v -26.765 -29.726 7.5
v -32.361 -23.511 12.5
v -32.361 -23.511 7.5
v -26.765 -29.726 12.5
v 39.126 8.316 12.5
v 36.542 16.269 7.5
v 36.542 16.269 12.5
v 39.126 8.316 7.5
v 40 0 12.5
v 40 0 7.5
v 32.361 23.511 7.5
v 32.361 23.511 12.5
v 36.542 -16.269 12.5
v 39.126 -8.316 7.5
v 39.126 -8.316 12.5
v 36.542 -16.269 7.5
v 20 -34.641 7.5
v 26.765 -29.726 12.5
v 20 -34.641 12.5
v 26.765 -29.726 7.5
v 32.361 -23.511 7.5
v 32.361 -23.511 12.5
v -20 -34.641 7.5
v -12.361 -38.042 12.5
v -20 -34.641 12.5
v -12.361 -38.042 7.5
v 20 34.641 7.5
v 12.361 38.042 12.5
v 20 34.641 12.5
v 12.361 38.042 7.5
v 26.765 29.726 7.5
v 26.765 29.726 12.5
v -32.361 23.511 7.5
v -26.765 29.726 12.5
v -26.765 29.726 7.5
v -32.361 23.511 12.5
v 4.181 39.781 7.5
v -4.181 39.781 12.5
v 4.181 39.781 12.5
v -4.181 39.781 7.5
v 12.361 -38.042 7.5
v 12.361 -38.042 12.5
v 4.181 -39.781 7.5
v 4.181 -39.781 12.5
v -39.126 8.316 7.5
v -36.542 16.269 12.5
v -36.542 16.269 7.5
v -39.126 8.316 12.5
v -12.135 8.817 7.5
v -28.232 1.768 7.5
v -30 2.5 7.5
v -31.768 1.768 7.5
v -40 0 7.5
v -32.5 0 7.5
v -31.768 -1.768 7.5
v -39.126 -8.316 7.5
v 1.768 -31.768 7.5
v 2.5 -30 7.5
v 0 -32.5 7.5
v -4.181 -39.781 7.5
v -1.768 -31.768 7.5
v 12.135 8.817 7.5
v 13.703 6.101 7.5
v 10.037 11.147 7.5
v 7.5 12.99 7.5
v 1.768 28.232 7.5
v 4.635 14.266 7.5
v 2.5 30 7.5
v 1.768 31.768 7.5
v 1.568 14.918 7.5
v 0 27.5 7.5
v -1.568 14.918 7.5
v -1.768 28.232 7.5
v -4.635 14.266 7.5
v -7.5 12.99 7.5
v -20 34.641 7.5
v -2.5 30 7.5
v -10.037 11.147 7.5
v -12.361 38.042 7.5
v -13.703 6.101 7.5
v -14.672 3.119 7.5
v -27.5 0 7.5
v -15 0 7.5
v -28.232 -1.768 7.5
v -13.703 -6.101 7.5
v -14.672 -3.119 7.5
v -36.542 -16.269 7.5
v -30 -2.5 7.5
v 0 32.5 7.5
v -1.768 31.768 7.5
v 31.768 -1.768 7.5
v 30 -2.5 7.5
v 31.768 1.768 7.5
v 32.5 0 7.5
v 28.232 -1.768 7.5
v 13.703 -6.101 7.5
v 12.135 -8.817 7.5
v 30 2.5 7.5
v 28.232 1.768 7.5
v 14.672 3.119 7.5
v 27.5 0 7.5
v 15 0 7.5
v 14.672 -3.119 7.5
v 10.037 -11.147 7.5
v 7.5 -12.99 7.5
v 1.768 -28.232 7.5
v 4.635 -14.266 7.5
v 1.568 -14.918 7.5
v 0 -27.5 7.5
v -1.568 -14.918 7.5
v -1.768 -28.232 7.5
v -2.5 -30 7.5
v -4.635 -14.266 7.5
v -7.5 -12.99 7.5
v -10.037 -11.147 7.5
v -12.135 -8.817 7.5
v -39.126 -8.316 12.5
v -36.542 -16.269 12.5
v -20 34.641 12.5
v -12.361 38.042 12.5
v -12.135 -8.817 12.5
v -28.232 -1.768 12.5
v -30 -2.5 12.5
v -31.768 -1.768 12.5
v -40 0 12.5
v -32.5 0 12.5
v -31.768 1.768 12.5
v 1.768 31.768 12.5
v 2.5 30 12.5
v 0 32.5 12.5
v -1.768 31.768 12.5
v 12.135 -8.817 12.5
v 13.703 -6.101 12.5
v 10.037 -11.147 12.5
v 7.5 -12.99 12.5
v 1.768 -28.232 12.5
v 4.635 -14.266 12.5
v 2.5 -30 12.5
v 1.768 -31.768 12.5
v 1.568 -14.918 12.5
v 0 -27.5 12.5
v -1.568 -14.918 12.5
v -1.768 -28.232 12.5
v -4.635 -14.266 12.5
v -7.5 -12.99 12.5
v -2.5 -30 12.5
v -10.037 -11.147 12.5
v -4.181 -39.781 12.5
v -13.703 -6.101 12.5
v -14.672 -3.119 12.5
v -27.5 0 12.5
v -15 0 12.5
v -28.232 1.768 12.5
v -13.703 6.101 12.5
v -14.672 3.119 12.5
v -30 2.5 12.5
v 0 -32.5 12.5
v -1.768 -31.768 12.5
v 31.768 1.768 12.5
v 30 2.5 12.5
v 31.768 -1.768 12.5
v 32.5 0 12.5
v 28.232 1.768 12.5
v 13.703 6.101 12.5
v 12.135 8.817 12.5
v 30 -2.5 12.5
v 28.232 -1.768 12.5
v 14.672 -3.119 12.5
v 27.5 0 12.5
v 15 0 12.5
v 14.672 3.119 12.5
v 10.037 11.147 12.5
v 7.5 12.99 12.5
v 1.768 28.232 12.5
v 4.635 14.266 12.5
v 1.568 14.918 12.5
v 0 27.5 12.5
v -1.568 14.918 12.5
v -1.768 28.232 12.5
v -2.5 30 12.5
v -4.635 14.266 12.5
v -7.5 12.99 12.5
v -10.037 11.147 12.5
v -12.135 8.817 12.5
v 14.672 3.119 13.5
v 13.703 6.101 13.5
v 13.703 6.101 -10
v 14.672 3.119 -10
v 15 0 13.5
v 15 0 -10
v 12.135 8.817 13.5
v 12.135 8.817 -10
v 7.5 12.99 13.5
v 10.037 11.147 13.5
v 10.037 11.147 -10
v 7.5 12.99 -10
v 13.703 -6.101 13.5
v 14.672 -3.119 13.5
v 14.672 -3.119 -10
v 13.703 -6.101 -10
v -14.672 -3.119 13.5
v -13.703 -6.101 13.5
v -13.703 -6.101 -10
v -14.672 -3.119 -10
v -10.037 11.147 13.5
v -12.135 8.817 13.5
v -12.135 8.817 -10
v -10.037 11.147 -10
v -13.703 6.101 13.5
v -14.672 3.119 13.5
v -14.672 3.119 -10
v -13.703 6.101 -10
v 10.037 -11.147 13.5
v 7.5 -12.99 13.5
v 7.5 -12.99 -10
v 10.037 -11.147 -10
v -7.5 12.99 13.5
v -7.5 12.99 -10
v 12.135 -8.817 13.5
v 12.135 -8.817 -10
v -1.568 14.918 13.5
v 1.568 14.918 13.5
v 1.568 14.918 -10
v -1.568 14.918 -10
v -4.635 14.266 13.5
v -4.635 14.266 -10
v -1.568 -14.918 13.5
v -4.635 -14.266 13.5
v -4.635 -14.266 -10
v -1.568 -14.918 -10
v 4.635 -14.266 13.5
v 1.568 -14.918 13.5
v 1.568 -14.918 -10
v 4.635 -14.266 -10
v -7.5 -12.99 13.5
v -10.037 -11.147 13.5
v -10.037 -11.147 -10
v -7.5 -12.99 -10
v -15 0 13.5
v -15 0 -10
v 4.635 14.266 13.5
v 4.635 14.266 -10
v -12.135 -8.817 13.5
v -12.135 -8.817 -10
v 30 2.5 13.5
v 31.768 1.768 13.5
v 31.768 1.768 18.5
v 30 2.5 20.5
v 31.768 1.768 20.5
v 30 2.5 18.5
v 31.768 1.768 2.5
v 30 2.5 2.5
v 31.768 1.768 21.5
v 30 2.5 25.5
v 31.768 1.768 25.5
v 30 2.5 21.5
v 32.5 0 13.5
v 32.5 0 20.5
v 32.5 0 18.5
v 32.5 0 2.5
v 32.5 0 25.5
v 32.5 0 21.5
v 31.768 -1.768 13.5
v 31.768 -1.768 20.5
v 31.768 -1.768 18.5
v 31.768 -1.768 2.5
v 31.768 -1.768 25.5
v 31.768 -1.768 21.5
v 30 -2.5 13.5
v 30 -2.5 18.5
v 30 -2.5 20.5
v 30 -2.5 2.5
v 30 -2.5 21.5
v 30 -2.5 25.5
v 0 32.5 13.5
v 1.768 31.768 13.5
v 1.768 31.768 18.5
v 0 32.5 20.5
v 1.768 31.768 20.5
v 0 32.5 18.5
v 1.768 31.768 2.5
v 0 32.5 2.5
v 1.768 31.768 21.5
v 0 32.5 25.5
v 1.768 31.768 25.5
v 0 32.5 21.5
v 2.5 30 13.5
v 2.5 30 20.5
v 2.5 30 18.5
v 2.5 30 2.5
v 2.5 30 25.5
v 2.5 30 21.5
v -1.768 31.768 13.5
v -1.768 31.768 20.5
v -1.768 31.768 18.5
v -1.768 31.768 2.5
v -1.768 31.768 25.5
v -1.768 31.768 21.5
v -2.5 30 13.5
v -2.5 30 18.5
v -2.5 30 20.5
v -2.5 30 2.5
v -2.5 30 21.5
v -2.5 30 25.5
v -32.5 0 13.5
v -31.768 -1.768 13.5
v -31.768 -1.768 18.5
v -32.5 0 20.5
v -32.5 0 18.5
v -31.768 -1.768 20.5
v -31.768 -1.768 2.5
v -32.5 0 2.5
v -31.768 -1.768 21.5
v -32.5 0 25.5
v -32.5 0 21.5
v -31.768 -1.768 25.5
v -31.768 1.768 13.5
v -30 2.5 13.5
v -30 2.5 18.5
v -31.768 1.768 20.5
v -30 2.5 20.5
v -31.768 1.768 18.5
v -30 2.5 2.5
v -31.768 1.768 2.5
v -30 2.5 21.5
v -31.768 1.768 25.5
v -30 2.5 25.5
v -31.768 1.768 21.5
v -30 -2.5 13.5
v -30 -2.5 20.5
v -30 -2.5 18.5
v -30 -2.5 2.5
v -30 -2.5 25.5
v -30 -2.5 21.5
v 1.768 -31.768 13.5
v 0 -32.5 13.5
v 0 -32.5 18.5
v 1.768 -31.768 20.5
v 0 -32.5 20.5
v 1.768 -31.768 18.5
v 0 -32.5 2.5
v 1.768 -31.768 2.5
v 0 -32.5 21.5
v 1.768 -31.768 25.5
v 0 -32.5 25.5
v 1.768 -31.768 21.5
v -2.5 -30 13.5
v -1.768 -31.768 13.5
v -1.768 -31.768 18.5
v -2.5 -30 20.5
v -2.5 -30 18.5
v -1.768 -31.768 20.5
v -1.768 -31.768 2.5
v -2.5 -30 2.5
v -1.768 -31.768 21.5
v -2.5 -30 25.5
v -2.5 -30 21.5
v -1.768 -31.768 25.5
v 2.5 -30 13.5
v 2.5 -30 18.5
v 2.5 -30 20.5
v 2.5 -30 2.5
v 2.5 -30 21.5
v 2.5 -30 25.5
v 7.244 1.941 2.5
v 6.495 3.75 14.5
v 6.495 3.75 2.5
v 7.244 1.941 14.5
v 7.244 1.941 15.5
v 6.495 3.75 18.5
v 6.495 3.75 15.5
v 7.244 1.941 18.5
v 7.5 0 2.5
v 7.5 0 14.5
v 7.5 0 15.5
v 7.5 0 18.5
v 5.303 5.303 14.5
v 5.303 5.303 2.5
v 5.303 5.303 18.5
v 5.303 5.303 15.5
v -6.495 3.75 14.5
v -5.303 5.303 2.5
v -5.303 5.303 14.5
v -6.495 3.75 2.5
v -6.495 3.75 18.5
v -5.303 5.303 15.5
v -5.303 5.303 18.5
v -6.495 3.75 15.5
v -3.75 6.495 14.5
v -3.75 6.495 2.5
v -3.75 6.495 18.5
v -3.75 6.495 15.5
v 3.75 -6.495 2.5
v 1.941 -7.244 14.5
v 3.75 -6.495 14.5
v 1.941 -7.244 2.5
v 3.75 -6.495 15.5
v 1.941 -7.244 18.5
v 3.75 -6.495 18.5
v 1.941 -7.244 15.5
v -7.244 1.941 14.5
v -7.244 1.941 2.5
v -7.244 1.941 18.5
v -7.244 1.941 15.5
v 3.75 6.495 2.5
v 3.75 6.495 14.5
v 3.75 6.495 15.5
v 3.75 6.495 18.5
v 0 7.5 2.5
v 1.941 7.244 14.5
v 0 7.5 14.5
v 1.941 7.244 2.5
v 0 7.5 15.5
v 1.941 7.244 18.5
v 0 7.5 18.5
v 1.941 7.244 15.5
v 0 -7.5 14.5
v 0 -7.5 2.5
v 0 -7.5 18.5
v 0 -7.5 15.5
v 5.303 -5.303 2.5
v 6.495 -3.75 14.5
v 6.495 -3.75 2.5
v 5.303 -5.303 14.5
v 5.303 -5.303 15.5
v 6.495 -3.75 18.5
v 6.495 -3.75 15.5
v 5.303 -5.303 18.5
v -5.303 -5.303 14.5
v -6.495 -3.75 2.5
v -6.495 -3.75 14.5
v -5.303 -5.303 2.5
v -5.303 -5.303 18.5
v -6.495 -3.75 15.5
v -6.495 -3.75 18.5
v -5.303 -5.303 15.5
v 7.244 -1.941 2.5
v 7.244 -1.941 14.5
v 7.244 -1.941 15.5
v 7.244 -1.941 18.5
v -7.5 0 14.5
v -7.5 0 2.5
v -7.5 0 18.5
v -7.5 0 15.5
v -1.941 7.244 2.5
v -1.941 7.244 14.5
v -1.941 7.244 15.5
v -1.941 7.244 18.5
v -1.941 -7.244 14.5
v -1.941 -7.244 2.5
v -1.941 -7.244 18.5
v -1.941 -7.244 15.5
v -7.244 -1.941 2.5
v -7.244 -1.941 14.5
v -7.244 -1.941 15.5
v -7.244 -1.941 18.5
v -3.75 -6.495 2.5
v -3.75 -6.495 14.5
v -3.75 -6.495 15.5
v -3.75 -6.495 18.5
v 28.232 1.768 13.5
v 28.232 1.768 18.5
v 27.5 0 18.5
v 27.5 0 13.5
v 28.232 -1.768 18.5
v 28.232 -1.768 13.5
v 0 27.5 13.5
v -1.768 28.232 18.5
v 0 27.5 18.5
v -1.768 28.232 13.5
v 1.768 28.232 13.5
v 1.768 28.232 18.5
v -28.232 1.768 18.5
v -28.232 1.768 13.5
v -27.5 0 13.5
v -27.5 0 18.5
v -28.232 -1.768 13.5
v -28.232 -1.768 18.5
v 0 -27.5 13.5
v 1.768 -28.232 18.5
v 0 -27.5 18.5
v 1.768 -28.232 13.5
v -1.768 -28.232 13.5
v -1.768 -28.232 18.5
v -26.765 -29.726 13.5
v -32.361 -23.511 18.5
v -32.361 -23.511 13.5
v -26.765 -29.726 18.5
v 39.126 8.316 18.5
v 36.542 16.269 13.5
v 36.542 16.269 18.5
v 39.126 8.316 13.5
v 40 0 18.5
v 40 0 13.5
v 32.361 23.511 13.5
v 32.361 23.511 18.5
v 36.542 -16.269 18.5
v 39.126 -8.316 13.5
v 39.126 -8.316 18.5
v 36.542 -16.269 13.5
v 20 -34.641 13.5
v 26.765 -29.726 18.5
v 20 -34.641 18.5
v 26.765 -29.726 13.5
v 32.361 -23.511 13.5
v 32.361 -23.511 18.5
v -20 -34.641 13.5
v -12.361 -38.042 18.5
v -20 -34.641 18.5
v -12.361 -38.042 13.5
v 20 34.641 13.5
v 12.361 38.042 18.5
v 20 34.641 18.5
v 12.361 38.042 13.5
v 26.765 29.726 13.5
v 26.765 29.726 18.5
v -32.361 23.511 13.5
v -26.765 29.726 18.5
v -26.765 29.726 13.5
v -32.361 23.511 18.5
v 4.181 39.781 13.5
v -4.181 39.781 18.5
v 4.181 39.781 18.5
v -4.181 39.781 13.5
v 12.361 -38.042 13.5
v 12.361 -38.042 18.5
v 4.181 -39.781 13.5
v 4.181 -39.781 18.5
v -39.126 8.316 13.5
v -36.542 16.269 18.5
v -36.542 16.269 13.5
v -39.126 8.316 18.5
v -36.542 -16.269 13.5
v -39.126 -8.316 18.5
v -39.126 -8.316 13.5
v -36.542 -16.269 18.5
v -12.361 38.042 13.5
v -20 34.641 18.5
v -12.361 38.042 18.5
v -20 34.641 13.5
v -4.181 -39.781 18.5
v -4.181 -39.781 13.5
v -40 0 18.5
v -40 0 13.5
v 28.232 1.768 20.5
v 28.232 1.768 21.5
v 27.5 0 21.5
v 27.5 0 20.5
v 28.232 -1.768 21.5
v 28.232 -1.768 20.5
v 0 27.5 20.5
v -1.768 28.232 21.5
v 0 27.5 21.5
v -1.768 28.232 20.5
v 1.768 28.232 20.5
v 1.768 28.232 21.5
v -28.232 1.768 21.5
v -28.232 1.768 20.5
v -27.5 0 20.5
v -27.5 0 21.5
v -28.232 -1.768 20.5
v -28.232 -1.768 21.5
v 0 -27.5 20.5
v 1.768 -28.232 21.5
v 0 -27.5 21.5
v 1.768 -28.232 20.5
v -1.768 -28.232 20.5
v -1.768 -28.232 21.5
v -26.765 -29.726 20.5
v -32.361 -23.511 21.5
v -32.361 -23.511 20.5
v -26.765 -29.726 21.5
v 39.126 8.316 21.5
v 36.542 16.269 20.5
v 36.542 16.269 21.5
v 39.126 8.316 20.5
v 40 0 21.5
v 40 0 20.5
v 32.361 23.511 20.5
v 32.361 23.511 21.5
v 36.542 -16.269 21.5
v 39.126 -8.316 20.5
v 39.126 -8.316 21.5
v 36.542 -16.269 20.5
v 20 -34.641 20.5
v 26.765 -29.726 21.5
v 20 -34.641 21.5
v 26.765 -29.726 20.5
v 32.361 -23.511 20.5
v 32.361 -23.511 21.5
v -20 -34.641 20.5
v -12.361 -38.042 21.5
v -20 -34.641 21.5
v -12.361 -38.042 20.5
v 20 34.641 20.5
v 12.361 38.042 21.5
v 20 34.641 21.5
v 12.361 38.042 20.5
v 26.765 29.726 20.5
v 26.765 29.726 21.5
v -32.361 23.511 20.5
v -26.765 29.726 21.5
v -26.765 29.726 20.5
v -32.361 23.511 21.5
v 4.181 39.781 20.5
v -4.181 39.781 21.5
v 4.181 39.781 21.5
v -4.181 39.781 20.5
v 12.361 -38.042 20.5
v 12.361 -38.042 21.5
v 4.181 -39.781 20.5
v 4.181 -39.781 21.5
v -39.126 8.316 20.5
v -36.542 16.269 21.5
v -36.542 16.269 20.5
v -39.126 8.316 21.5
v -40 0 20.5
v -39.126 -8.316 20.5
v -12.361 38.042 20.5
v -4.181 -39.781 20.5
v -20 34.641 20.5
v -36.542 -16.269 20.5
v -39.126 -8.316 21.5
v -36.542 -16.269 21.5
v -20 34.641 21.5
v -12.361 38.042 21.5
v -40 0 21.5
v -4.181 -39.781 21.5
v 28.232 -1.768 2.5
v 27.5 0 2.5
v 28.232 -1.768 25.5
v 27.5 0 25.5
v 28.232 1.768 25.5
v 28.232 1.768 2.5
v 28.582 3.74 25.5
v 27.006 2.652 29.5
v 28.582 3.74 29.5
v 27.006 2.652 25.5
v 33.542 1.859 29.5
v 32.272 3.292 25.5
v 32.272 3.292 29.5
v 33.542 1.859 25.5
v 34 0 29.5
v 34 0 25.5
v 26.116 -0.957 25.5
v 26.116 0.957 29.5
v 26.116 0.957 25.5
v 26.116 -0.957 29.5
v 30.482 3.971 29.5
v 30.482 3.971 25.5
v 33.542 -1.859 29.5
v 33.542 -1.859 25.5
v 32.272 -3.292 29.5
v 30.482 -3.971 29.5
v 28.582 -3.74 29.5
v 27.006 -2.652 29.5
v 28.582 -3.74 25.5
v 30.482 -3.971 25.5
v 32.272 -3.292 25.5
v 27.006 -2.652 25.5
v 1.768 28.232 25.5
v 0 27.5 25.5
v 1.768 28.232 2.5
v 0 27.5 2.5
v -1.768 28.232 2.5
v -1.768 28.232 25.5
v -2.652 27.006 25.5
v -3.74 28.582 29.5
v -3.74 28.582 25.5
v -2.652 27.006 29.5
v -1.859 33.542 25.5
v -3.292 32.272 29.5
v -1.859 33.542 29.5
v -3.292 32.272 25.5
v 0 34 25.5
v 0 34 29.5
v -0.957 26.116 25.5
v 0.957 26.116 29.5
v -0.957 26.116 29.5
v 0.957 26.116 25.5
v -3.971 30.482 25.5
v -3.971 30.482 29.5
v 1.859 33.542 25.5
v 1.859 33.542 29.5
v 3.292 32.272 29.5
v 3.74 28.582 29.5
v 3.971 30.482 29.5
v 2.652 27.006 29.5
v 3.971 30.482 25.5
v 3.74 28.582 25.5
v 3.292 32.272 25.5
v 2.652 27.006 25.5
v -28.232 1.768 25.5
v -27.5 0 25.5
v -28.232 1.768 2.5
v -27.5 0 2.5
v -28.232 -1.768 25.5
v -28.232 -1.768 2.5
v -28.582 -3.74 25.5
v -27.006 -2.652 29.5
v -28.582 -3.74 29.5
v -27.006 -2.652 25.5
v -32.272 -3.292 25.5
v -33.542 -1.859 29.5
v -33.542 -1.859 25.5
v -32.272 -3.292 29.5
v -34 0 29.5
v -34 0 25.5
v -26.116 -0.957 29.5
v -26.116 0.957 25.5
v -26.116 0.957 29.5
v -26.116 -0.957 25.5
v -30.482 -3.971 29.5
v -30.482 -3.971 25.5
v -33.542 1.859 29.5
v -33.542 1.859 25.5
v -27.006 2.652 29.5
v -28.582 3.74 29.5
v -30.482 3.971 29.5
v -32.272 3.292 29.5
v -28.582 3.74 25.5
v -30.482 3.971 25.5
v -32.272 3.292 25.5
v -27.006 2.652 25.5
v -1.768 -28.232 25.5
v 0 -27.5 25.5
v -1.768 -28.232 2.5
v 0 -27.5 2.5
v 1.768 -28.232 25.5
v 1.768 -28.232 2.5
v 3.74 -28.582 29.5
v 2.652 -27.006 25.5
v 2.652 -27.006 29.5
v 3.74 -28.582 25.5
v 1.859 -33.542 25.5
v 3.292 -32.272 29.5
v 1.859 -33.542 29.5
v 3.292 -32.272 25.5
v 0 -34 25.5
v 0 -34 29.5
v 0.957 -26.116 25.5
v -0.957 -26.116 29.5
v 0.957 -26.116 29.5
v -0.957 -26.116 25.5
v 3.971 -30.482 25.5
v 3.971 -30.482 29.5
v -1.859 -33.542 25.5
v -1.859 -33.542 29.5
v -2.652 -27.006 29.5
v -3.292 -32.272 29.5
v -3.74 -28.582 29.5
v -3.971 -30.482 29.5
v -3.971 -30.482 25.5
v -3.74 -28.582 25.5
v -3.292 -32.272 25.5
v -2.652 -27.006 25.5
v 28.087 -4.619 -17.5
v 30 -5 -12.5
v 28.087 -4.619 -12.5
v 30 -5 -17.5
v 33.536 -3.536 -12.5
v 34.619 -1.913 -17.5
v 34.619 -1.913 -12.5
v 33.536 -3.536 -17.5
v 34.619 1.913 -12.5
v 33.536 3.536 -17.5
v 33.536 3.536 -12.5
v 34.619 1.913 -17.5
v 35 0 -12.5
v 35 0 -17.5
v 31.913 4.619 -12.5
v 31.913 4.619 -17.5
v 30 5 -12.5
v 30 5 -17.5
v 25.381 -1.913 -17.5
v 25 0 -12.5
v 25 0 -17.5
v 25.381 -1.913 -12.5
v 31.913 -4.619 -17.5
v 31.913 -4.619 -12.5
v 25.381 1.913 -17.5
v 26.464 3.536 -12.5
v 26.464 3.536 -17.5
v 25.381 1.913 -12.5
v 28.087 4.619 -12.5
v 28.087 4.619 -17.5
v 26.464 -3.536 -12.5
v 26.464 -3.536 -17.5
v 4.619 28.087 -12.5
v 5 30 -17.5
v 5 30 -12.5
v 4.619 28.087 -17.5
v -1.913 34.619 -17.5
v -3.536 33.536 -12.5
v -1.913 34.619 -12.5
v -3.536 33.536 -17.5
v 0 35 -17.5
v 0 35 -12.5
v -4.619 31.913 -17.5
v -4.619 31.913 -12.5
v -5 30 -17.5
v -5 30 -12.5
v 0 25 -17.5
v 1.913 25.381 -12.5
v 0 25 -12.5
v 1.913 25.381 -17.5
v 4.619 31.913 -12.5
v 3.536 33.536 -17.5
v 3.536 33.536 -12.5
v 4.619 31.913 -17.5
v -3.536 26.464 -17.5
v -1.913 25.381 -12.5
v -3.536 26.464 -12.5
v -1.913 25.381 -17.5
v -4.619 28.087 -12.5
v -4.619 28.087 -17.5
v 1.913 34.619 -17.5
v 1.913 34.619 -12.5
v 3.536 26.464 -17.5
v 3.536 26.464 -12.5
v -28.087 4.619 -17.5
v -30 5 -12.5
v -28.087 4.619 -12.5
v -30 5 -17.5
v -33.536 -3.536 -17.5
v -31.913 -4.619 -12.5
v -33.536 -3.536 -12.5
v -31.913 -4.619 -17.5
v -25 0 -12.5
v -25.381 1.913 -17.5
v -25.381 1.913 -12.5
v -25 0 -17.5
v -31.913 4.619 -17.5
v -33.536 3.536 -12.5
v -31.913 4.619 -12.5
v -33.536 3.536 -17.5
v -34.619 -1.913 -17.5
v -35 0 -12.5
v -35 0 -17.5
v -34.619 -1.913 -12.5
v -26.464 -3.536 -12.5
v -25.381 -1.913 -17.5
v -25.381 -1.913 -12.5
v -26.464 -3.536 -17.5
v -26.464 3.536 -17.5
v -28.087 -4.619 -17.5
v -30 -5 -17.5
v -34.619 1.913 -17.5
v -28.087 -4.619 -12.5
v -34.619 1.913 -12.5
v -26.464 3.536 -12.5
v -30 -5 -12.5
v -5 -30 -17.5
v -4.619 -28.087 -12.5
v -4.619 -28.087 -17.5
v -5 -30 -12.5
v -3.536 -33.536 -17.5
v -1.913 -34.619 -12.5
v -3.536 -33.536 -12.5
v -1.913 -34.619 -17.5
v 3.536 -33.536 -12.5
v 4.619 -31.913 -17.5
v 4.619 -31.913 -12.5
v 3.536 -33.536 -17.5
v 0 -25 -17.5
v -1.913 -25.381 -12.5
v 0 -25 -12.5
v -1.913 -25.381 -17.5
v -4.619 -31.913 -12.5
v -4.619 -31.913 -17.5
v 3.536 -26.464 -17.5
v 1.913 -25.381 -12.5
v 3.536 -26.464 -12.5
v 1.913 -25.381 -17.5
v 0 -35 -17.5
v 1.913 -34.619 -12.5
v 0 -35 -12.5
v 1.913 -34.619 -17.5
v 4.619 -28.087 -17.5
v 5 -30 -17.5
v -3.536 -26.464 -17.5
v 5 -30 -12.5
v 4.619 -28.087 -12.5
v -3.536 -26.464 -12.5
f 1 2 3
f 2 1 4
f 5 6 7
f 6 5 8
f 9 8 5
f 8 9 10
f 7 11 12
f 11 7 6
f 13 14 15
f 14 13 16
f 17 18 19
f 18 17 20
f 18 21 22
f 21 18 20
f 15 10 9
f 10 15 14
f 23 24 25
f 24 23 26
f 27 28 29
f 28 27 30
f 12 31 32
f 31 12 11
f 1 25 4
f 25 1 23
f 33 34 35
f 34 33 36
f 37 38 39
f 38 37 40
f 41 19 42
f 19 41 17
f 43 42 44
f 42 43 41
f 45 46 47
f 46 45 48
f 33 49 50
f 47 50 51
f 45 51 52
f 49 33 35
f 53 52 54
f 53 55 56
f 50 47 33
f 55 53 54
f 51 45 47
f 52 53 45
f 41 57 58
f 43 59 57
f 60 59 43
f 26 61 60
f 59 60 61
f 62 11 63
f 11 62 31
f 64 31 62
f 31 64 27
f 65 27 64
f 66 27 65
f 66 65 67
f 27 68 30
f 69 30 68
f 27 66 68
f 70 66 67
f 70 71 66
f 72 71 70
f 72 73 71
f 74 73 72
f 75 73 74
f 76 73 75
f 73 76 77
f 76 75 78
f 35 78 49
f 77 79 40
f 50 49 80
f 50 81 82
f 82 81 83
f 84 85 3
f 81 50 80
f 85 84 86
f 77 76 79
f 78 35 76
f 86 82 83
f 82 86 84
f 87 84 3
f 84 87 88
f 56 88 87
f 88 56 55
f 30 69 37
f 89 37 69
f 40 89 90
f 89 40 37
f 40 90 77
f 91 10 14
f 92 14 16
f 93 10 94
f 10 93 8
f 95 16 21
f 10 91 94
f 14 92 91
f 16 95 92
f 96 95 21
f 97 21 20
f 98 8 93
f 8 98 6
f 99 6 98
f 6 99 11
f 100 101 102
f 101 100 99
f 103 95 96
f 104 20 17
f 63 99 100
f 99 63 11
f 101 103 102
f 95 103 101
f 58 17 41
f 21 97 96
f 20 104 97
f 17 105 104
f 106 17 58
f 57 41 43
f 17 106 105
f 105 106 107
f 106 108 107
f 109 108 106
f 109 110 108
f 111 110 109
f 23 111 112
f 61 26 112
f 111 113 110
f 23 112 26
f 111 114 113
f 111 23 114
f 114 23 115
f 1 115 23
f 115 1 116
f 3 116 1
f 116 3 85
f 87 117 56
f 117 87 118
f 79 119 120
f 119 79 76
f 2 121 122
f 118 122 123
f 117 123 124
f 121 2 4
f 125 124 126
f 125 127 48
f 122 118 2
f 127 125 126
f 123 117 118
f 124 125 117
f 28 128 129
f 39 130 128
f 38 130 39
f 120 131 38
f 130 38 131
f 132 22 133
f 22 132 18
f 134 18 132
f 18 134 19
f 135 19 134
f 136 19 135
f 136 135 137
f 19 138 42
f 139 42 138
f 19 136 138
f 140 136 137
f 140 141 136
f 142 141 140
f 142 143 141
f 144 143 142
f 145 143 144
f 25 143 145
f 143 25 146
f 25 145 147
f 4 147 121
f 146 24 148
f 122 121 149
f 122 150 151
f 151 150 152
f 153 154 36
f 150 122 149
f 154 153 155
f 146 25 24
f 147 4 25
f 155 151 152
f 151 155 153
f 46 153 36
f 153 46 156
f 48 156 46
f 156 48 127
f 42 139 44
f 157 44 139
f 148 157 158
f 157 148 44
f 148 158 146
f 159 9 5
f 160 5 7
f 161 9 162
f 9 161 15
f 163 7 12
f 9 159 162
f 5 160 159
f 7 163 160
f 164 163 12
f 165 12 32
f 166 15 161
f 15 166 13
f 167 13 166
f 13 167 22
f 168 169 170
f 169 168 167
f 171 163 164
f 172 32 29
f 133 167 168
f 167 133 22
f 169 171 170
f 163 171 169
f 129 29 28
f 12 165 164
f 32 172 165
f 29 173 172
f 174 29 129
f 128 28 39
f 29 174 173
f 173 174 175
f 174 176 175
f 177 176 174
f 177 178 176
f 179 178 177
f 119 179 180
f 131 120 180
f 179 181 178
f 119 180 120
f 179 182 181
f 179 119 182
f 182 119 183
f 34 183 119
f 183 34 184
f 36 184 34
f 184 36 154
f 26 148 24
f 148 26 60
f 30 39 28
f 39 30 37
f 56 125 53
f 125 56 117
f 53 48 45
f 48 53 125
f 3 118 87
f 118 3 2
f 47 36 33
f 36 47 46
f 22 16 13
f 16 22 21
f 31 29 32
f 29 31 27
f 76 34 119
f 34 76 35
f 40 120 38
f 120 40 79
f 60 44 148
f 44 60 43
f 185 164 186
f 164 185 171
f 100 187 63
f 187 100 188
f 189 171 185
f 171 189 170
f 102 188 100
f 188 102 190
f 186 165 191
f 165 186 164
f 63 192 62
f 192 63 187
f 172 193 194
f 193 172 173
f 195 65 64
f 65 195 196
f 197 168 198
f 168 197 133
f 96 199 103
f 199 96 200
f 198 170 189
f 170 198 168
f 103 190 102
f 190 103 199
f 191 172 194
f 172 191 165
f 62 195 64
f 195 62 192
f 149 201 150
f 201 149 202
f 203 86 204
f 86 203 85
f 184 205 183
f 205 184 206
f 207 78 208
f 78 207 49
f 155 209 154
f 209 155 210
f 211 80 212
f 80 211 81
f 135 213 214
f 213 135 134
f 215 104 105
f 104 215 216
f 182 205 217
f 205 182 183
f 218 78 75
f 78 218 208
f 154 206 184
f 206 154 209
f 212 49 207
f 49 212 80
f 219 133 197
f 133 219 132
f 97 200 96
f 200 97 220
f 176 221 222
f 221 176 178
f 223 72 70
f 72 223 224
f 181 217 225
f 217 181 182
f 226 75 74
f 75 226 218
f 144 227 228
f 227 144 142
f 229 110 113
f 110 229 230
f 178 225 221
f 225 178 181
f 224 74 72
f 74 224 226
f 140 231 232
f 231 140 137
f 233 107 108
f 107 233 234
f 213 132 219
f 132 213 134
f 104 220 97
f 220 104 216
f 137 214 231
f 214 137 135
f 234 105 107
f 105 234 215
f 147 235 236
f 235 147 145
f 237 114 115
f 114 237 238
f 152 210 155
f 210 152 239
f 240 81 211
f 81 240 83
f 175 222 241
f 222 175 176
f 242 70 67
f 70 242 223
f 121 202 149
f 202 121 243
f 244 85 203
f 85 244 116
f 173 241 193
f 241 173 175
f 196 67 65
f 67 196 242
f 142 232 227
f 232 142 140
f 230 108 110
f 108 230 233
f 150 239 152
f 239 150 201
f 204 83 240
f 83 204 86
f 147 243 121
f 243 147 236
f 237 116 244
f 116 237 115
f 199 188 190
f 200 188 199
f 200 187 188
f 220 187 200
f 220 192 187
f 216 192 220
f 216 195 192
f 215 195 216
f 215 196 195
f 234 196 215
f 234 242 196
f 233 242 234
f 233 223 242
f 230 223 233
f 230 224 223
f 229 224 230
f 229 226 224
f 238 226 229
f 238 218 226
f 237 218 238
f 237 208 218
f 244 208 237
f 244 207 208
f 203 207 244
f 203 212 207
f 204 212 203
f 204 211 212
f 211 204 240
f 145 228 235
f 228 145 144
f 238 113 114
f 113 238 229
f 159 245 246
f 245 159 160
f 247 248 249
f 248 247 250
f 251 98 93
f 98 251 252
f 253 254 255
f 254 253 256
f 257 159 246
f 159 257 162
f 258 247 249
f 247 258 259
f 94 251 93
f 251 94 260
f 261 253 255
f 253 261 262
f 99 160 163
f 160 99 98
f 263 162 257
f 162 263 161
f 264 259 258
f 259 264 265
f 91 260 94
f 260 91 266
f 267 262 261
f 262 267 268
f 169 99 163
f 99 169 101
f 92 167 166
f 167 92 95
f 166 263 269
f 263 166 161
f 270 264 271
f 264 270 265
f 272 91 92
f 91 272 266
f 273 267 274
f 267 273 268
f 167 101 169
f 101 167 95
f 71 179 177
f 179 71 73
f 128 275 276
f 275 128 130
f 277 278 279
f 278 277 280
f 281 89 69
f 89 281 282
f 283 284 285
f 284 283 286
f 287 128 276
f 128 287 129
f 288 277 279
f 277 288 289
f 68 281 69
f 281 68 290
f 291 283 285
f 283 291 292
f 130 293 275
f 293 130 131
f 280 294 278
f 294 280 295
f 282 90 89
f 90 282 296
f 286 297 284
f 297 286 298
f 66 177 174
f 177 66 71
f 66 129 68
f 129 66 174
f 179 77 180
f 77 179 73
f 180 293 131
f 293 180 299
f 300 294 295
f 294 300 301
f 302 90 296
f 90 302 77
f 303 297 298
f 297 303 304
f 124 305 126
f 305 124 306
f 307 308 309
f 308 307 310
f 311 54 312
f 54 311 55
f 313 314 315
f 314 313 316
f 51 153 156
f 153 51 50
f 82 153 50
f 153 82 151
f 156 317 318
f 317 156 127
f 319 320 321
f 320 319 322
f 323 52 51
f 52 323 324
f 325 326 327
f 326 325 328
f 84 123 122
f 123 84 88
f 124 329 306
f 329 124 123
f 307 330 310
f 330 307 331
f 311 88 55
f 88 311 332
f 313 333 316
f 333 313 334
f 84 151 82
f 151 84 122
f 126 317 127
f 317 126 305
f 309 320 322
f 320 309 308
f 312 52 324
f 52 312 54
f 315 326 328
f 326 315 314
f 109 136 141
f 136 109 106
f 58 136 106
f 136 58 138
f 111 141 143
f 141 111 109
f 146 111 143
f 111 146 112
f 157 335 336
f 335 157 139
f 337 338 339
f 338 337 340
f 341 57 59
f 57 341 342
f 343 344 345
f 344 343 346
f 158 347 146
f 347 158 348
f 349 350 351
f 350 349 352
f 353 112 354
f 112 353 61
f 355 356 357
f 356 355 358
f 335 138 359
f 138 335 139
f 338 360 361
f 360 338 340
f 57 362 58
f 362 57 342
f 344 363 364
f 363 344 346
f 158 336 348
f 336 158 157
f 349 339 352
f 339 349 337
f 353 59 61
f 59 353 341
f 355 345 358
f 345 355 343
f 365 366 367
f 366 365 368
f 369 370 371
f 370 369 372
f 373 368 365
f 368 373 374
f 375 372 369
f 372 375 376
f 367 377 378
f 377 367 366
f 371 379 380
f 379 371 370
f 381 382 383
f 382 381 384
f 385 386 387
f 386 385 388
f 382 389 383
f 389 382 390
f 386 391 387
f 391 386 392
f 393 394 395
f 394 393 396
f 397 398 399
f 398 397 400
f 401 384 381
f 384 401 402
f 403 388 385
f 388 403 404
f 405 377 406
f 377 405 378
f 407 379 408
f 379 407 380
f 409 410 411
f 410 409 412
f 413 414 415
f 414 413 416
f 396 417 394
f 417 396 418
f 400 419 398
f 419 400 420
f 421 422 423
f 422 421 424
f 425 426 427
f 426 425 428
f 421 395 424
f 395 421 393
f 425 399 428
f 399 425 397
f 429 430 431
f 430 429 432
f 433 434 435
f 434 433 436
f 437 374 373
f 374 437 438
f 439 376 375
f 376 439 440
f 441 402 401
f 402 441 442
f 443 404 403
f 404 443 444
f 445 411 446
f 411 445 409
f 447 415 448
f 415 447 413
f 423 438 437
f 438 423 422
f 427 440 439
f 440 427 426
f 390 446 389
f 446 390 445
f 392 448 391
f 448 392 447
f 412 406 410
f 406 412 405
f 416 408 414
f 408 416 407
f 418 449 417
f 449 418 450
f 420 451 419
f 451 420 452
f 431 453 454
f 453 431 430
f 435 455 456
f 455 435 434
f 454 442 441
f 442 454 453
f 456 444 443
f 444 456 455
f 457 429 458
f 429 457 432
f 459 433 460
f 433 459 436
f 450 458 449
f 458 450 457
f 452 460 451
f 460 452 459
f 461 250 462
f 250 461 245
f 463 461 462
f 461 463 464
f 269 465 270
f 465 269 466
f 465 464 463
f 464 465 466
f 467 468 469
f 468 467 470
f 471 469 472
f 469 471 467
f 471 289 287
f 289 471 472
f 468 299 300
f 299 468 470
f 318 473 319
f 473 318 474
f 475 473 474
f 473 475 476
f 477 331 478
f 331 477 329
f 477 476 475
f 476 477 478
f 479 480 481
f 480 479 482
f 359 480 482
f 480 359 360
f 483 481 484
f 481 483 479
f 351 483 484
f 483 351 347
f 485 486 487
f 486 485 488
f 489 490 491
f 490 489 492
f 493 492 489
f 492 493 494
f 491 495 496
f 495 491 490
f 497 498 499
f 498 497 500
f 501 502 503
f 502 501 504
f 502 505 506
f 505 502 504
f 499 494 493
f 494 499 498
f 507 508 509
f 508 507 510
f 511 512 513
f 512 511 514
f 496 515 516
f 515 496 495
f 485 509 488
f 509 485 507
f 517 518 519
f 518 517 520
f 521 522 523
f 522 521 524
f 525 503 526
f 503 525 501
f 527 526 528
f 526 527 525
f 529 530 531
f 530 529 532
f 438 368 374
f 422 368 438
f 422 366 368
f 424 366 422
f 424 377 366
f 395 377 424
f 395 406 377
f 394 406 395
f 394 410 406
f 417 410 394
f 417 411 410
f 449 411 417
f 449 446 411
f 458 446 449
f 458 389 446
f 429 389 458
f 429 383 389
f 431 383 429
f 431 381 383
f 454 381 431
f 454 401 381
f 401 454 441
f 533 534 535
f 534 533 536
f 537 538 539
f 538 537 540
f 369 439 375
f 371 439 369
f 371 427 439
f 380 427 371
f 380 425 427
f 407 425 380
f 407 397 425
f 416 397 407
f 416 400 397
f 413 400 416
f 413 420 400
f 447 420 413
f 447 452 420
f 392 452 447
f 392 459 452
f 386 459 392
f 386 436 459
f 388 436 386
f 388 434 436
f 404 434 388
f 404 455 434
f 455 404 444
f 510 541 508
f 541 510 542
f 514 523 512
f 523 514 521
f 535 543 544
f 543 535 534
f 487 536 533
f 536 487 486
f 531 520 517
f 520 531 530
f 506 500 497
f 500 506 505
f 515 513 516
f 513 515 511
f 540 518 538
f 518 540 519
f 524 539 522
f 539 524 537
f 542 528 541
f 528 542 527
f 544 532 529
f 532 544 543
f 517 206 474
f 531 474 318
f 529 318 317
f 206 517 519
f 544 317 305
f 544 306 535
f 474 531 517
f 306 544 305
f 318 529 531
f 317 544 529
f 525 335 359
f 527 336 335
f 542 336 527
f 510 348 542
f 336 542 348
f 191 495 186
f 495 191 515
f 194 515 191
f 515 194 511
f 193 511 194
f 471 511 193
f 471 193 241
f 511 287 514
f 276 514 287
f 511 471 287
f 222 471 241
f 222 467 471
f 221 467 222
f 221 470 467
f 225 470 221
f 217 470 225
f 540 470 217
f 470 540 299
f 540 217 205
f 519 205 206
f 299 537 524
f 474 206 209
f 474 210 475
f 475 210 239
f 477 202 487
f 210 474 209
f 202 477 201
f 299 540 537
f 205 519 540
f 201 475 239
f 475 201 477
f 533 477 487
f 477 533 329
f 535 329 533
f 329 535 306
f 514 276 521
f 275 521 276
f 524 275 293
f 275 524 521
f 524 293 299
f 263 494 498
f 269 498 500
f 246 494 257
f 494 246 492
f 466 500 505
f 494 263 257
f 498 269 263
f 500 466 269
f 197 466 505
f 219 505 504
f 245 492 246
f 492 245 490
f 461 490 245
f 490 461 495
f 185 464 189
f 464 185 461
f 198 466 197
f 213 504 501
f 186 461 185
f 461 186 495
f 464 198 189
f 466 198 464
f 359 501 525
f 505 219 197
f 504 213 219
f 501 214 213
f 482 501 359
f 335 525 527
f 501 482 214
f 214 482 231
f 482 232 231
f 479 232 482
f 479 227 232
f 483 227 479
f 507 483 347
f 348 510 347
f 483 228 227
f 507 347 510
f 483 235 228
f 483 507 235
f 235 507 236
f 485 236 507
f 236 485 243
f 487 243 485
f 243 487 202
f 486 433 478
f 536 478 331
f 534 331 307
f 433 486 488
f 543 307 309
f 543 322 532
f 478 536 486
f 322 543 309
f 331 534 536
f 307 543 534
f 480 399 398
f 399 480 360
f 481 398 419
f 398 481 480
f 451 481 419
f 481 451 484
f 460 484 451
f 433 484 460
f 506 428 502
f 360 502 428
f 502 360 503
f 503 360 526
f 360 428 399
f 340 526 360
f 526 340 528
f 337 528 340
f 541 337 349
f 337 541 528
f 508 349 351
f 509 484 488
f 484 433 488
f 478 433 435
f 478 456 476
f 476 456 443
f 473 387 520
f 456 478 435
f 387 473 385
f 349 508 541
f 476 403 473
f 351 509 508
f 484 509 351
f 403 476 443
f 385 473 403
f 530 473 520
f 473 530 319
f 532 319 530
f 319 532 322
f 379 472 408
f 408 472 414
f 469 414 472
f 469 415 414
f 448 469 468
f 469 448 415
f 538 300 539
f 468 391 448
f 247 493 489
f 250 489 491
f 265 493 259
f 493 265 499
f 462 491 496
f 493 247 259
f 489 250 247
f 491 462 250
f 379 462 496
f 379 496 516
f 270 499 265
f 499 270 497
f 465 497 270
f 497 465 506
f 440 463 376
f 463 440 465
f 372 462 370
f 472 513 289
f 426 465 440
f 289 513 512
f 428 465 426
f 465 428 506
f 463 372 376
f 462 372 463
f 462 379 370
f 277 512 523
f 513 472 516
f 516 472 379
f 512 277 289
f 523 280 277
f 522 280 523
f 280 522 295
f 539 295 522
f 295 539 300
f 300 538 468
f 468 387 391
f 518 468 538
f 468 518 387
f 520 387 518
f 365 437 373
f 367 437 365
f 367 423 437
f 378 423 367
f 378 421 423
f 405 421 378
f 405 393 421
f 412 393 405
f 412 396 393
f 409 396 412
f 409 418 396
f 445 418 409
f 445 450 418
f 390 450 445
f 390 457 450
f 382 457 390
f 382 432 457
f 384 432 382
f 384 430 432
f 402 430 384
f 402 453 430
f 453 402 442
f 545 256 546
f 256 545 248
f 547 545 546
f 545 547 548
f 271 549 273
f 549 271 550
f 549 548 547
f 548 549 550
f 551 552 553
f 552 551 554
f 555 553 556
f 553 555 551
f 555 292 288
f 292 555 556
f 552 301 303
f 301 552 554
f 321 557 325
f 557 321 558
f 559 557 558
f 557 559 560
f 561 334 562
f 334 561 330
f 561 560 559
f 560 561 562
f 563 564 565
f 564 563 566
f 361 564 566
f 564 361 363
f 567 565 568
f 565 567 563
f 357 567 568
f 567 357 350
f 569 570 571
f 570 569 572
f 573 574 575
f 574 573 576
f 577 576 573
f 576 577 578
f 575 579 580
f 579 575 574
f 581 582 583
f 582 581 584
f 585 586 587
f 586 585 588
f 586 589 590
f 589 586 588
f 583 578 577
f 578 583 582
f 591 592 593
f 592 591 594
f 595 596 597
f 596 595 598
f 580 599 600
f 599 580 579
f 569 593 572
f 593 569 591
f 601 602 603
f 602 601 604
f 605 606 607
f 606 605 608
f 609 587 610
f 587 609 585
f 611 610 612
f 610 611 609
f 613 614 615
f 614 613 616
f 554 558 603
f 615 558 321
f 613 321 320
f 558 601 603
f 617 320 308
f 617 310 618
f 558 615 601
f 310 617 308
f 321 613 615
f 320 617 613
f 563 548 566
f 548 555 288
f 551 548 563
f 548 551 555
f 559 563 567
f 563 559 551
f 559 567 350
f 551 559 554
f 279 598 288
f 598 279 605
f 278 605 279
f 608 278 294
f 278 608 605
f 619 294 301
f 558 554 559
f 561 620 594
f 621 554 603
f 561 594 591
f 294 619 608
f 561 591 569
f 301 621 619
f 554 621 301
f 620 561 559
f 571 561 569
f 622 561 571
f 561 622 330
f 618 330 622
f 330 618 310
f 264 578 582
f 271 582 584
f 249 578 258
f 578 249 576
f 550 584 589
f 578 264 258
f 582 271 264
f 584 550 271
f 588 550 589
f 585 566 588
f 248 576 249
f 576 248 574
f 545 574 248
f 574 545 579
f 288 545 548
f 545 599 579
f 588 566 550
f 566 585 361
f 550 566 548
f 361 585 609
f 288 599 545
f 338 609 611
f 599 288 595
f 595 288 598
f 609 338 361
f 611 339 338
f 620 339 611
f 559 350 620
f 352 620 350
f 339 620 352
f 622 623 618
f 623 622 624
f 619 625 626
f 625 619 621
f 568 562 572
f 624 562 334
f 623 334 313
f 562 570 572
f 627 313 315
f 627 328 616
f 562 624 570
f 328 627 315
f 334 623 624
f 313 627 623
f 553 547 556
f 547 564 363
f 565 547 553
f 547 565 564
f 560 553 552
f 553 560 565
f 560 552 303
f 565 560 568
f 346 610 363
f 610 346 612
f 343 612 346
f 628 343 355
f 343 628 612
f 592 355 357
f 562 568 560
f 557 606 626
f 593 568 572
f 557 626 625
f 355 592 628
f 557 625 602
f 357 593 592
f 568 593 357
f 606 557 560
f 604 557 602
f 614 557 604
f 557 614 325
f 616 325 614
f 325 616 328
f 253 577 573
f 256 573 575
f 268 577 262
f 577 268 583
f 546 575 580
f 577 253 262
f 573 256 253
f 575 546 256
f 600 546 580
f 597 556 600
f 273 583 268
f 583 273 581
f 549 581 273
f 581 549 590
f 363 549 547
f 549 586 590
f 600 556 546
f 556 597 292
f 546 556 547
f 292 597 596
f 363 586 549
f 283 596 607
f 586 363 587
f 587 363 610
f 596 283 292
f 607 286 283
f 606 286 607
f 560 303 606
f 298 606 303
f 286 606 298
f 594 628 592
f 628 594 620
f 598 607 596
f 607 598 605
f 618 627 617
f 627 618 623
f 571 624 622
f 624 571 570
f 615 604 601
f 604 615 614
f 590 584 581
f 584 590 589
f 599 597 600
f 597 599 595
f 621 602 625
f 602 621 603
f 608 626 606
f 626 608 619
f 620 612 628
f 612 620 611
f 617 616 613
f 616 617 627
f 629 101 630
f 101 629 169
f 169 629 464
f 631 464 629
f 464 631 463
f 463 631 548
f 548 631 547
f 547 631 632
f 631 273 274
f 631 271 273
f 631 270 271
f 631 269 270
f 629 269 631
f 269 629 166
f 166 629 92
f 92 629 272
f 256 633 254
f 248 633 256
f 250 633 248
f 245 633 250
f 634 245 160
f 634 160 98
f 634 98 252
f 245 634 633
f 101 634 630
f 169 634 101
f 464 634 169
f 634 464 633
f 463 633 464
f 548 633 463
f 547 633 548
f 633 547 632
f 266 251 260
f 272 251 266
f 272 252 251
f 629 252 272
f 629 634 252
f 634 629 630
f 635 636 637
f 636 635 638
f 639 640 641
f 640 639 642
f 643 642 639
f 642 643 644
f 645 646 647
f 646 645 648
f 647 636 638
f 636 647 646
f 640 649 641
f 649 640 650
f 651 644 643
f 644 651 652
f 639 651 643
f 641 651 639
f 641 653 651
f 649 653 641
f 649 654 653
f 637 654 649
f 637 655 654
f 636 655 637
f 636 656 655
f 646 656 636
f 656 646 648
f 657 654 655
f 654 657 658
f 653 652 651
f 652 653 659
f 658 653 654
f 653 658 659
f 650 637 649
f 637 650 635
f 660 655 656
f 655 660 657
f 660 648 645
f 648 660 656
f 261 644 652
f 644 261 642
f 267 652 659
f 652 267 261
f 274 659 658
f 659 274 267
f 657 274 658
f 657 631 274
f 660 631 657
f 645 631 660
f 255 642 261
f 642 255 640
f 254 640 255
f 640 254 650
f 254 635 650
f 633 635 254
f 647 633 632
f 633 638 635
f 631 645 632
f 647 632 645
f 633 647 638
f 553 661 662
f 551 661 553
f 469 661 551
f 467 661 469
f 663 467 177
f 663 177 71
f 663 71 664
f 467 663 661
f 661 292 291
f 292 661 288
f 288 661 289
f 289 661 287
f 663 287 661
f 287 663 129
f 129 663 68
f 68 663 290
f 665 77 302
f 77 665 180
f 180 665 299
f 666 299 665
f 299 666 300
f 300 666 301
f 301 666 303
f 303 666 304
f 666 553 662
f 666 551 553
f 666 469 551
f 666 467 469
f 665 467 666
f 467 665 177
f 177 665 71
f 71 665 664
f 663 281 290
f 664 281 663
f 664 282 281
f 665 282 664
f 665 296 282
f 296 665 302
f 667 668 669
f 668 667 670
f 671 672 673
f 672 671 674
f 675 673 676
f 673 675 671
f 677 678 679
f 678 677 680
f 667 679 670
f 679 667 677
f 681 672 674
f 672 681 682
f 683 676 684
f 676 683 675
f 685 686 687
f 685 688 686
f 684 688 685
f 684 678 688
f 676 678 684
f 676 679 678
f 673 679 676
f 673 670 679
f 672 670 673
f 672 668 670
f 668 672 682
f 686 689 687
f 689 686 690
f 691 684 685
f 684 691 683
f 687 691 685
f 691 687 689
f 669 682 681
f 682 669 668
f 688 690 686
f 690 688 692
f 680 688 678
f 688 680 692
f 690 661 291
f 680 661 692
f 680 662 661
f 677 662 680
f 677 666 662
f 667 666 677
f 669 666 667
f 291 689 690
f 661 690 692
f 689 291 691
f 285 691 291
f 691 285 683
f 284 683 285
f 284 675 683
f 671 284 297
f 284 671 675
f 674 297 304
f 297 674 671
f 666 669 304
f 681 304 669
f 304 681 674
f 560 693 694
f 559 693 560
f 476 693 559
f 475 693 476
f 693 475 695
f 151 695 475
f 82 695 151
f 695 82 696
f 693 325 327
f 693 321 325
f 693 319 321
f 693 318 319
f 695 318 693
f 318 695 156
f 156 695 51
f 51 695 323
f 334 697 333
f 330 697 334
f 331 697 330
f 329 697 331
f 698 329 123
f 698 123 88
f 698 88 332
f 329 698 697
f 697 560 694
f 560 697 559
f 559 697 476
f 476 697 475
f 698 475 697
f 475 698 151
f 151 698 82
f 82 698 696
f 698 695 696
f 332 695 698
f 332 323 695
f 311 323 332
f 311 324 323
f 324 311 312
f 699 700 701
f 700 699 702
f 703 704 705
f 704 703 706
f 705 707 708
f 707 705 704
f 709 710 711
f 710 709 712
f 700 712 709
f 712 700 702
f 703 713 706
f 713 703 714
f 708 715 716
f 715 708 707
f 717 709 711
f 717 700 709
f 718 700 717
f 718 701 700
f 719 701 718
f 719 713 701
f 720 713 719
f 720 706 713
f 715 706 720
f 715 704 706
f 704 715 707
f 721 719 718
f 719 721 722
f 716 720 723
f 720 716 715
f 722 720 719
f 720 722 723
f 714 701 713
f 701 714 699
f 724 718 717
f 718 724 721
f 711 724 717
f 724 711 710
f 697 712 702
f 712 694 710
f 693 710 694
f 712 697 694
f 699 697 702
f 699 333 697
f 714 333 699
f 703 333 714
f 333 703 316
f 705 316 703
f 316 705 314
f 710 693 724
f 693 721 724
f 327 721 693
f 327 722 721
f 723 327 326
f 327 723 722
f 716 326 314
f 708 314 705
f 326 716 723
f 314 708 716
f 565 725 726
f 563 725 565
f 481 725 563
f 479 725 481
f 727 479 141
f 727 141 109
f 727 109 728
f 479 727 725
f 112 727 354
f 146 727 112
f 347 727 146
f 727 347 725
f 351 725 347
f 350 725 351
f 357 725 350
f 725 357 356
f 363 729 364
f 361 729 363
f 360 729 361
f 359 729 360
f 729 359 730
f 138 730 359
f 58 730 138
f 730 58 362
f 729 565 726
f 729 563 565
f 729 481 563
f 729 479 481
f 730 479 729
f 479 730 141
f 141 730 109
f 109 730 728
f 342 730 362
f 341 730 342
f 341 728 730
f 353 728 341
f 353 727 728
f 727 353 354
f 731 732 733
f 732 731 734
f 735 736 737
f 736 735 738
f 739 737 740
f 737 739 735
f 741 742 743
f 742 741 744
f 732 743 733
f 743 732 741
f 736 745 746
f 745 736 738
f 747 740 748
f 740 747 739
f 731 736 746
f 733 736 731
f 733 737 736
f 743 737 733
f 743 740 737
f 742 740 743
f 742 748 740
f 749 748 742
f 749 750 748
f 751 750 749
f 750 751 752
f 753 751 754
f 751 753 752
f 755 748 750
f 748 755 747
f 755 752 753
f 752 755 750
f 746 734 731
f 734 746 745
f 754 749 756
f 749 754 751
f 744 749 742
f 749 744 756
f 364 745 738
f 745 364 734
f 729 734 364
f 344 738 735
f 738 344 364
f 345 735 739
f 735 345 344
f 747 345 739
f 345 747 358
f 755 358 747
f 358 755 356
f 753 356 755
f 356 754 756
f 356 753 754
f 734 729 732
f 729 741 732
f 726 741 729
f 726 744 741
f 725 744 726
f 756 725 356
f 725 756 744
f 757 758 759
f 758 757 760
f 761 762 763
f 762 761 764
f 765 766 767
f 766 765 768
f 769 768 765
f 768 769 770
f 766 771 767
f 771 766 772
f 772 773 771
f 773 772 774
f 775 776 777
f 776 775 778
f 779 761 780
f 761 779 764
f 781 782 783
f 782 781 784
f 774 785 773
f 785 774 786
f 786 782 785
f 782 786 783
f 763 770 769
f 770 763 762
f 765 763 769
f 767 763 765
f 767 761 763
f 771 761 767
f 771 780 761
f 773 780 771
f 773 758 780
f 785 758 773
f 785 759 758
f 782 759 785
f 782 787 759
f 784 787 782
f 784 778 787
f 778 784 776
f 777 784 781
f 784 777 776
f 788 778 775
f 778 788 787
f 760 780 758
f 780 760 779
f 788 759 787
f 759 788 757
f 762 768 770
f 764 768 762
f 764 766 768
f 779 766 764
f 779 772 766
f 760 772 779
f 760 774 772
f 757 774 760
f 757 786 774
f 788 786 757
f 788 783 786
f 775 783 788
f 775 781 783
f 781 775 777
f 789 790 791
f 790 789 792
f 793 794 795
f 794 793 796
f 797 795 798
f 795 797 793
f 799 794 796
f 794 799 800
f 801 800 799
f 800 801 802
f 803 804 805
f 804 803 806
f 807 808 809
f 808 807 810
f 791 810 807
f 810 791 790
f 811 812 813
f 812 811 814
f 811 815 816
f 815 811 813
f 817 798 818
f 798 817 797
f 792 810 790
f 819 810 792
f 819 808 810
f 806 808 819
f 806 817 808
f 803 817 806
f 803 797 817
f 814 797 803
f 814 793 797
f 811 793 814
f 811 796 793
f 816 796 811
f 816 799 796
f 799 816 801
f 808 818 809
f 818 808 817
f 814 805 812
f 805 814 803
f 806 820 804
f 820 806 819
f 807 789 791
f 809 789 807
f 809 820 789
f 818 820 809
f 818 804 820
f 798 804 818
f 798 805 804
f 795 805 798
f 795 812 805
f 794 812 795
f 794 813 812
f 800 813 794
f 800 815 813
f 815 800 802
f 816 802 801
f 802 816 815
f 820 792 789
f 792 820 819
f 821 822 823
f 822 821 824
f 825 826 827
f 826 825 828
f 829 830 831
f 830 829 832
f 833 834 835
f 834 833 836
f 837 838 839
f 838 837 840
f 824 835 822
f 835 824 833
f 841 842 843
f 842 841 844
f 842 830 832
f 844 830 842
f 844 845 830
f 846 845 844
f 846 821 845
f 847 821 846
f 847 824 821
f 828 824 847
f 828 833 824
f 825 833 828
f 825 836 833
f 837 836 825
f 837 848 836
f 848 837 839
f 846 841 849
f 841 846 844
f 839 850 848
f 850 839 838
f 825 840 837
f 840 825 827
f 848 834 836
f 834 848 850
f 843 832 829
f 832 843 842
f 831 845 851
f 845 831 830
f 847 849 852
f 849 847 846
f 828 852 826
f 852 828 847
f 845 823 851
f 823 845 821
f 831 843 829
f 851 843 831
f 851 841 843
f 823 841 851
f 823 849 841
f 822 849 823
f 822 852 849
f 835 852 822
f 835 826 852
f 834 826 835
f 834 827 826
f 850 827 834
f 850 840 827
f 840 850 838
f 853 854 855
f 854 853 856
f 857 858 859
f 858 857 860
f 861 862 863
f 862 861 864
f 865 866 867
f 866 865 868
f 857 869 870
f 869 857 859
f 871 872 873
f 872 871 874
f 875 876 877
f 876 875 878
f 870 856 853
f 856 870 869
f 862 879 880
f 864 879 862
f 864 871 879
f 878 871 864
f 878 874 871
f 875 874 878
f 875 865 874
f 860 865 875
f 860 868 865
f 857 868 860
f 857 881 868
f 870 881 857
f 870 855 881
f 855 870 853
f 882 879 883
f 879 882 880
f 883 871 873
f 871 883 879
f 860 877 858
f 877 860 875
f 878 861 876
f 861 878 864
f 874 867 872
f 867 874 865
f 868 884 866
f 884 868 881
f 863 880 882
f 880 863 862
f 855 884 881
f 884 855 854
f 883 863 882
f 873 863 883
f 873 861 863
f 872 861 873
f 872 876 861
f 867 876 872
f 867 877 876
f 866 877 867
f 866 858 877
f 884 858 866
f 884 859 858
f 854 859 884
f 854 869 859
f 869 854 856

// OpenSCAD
// Parameters
flange_diameter = 80;
flange_thickness = 5;
hub_diameter = 30;
hub_length = 20;
shaft_hole_diameter = 15;
bolt_hole_diameter = 5;
bolt_circle_diameter = 60;
bolt_length = 25;
bolt_head_diameter = 8;
bolt_head_height = 4;
nut_diameter = 10;
nut_thickness = 5;
num_bolts = 4;

// Function to create a flange hub
module flange_hub() {
    difference() {
        union() {
            // Flange
            cylinder(h=flange_thickness, d=flange_diameter, center=true);
            // Hub
            translate([0, 0, -hub_length/2])
                cylinder(h=hub_length, d=hub_diameter, center=true);
        }
        // Shaft hole
        cylinder(h=hub_length + flange_thickness + 2, d=shaft_hole_diameter, center=true);
        // Bolt holes
        for (i = [0:num_bolts-1]) {
            angle = i * 360 / num_bolts;
            translate([bolt_circle_diameter/2 * cos(angle), bolt_circle_diameter/2 * sin(angle), 0])
                cylinder(h=flange_thickness + 2, d=bolt_hole_diameter, center=true);
        }
    }
}

// Function to create a diaphragm
module diaphragm() {
    difference() {
        cylinder(h=1, d=flange_diameter, center=true);
        // Bolt holes
        for (i = [0:num_bolts-1]) {
            angle = i * 360 / num_bolts;
            translate([bolt_circle_diameter/2 * cos(angle), bolt_circle_diameter/2 * sin(angle), 0])
                cylinder(h=3, d=bolt_hole_diameter, center=true);
        }
    }
}

// Function to create a bolt
module bolt() {
    union() {
        // Bolt shaft
        cylinder(h=bolt_length, d=bolt_hole_diameter, center=true);
        // Bolt head
        translate([0, 0, bolt_length/2])
            cylinder(h=bolt_head_height, d=bolt_head_diameter, center=true);
    }
}

// Function to create a nut
module nut() {
    cylinder(h=nut_thickness, d=nut_diameter, center=true);
}

// Assembly
module coupling() {
    translate([0, 0, hub_length/2])
        flange_hub();
    translate([0, 0, hub_length/2 + flange_thickness])
        diaphragm();
    translate([0, 0, hub_length/2 + flange_thickness + 1])
        flange_hub();
    translate([0, 0, hub_length/2 + flange_thickness * 2 + 1])
        diaphragm();

    // Bolts and nuts
    for (i = [0:num_bolts-1]) {
        angle = i * 360 / num_bolts;
        translate([bolt_circle_diameter/2 * cos(angle), bolt_circle_diameter/2 * sin(angle), hub_length/2 + flange_thickness])
            rotate([0, 0, angle])
                bolt();
        translate([bolt_circle_diameter/2 * cos(angle), bolt_circle_diameter/2 * sin(angle), -hub_length/2 - flange_thickness])
            rotate([0, 0, angle])
                nut();
    }
}

// Render the coupling
coupling();
